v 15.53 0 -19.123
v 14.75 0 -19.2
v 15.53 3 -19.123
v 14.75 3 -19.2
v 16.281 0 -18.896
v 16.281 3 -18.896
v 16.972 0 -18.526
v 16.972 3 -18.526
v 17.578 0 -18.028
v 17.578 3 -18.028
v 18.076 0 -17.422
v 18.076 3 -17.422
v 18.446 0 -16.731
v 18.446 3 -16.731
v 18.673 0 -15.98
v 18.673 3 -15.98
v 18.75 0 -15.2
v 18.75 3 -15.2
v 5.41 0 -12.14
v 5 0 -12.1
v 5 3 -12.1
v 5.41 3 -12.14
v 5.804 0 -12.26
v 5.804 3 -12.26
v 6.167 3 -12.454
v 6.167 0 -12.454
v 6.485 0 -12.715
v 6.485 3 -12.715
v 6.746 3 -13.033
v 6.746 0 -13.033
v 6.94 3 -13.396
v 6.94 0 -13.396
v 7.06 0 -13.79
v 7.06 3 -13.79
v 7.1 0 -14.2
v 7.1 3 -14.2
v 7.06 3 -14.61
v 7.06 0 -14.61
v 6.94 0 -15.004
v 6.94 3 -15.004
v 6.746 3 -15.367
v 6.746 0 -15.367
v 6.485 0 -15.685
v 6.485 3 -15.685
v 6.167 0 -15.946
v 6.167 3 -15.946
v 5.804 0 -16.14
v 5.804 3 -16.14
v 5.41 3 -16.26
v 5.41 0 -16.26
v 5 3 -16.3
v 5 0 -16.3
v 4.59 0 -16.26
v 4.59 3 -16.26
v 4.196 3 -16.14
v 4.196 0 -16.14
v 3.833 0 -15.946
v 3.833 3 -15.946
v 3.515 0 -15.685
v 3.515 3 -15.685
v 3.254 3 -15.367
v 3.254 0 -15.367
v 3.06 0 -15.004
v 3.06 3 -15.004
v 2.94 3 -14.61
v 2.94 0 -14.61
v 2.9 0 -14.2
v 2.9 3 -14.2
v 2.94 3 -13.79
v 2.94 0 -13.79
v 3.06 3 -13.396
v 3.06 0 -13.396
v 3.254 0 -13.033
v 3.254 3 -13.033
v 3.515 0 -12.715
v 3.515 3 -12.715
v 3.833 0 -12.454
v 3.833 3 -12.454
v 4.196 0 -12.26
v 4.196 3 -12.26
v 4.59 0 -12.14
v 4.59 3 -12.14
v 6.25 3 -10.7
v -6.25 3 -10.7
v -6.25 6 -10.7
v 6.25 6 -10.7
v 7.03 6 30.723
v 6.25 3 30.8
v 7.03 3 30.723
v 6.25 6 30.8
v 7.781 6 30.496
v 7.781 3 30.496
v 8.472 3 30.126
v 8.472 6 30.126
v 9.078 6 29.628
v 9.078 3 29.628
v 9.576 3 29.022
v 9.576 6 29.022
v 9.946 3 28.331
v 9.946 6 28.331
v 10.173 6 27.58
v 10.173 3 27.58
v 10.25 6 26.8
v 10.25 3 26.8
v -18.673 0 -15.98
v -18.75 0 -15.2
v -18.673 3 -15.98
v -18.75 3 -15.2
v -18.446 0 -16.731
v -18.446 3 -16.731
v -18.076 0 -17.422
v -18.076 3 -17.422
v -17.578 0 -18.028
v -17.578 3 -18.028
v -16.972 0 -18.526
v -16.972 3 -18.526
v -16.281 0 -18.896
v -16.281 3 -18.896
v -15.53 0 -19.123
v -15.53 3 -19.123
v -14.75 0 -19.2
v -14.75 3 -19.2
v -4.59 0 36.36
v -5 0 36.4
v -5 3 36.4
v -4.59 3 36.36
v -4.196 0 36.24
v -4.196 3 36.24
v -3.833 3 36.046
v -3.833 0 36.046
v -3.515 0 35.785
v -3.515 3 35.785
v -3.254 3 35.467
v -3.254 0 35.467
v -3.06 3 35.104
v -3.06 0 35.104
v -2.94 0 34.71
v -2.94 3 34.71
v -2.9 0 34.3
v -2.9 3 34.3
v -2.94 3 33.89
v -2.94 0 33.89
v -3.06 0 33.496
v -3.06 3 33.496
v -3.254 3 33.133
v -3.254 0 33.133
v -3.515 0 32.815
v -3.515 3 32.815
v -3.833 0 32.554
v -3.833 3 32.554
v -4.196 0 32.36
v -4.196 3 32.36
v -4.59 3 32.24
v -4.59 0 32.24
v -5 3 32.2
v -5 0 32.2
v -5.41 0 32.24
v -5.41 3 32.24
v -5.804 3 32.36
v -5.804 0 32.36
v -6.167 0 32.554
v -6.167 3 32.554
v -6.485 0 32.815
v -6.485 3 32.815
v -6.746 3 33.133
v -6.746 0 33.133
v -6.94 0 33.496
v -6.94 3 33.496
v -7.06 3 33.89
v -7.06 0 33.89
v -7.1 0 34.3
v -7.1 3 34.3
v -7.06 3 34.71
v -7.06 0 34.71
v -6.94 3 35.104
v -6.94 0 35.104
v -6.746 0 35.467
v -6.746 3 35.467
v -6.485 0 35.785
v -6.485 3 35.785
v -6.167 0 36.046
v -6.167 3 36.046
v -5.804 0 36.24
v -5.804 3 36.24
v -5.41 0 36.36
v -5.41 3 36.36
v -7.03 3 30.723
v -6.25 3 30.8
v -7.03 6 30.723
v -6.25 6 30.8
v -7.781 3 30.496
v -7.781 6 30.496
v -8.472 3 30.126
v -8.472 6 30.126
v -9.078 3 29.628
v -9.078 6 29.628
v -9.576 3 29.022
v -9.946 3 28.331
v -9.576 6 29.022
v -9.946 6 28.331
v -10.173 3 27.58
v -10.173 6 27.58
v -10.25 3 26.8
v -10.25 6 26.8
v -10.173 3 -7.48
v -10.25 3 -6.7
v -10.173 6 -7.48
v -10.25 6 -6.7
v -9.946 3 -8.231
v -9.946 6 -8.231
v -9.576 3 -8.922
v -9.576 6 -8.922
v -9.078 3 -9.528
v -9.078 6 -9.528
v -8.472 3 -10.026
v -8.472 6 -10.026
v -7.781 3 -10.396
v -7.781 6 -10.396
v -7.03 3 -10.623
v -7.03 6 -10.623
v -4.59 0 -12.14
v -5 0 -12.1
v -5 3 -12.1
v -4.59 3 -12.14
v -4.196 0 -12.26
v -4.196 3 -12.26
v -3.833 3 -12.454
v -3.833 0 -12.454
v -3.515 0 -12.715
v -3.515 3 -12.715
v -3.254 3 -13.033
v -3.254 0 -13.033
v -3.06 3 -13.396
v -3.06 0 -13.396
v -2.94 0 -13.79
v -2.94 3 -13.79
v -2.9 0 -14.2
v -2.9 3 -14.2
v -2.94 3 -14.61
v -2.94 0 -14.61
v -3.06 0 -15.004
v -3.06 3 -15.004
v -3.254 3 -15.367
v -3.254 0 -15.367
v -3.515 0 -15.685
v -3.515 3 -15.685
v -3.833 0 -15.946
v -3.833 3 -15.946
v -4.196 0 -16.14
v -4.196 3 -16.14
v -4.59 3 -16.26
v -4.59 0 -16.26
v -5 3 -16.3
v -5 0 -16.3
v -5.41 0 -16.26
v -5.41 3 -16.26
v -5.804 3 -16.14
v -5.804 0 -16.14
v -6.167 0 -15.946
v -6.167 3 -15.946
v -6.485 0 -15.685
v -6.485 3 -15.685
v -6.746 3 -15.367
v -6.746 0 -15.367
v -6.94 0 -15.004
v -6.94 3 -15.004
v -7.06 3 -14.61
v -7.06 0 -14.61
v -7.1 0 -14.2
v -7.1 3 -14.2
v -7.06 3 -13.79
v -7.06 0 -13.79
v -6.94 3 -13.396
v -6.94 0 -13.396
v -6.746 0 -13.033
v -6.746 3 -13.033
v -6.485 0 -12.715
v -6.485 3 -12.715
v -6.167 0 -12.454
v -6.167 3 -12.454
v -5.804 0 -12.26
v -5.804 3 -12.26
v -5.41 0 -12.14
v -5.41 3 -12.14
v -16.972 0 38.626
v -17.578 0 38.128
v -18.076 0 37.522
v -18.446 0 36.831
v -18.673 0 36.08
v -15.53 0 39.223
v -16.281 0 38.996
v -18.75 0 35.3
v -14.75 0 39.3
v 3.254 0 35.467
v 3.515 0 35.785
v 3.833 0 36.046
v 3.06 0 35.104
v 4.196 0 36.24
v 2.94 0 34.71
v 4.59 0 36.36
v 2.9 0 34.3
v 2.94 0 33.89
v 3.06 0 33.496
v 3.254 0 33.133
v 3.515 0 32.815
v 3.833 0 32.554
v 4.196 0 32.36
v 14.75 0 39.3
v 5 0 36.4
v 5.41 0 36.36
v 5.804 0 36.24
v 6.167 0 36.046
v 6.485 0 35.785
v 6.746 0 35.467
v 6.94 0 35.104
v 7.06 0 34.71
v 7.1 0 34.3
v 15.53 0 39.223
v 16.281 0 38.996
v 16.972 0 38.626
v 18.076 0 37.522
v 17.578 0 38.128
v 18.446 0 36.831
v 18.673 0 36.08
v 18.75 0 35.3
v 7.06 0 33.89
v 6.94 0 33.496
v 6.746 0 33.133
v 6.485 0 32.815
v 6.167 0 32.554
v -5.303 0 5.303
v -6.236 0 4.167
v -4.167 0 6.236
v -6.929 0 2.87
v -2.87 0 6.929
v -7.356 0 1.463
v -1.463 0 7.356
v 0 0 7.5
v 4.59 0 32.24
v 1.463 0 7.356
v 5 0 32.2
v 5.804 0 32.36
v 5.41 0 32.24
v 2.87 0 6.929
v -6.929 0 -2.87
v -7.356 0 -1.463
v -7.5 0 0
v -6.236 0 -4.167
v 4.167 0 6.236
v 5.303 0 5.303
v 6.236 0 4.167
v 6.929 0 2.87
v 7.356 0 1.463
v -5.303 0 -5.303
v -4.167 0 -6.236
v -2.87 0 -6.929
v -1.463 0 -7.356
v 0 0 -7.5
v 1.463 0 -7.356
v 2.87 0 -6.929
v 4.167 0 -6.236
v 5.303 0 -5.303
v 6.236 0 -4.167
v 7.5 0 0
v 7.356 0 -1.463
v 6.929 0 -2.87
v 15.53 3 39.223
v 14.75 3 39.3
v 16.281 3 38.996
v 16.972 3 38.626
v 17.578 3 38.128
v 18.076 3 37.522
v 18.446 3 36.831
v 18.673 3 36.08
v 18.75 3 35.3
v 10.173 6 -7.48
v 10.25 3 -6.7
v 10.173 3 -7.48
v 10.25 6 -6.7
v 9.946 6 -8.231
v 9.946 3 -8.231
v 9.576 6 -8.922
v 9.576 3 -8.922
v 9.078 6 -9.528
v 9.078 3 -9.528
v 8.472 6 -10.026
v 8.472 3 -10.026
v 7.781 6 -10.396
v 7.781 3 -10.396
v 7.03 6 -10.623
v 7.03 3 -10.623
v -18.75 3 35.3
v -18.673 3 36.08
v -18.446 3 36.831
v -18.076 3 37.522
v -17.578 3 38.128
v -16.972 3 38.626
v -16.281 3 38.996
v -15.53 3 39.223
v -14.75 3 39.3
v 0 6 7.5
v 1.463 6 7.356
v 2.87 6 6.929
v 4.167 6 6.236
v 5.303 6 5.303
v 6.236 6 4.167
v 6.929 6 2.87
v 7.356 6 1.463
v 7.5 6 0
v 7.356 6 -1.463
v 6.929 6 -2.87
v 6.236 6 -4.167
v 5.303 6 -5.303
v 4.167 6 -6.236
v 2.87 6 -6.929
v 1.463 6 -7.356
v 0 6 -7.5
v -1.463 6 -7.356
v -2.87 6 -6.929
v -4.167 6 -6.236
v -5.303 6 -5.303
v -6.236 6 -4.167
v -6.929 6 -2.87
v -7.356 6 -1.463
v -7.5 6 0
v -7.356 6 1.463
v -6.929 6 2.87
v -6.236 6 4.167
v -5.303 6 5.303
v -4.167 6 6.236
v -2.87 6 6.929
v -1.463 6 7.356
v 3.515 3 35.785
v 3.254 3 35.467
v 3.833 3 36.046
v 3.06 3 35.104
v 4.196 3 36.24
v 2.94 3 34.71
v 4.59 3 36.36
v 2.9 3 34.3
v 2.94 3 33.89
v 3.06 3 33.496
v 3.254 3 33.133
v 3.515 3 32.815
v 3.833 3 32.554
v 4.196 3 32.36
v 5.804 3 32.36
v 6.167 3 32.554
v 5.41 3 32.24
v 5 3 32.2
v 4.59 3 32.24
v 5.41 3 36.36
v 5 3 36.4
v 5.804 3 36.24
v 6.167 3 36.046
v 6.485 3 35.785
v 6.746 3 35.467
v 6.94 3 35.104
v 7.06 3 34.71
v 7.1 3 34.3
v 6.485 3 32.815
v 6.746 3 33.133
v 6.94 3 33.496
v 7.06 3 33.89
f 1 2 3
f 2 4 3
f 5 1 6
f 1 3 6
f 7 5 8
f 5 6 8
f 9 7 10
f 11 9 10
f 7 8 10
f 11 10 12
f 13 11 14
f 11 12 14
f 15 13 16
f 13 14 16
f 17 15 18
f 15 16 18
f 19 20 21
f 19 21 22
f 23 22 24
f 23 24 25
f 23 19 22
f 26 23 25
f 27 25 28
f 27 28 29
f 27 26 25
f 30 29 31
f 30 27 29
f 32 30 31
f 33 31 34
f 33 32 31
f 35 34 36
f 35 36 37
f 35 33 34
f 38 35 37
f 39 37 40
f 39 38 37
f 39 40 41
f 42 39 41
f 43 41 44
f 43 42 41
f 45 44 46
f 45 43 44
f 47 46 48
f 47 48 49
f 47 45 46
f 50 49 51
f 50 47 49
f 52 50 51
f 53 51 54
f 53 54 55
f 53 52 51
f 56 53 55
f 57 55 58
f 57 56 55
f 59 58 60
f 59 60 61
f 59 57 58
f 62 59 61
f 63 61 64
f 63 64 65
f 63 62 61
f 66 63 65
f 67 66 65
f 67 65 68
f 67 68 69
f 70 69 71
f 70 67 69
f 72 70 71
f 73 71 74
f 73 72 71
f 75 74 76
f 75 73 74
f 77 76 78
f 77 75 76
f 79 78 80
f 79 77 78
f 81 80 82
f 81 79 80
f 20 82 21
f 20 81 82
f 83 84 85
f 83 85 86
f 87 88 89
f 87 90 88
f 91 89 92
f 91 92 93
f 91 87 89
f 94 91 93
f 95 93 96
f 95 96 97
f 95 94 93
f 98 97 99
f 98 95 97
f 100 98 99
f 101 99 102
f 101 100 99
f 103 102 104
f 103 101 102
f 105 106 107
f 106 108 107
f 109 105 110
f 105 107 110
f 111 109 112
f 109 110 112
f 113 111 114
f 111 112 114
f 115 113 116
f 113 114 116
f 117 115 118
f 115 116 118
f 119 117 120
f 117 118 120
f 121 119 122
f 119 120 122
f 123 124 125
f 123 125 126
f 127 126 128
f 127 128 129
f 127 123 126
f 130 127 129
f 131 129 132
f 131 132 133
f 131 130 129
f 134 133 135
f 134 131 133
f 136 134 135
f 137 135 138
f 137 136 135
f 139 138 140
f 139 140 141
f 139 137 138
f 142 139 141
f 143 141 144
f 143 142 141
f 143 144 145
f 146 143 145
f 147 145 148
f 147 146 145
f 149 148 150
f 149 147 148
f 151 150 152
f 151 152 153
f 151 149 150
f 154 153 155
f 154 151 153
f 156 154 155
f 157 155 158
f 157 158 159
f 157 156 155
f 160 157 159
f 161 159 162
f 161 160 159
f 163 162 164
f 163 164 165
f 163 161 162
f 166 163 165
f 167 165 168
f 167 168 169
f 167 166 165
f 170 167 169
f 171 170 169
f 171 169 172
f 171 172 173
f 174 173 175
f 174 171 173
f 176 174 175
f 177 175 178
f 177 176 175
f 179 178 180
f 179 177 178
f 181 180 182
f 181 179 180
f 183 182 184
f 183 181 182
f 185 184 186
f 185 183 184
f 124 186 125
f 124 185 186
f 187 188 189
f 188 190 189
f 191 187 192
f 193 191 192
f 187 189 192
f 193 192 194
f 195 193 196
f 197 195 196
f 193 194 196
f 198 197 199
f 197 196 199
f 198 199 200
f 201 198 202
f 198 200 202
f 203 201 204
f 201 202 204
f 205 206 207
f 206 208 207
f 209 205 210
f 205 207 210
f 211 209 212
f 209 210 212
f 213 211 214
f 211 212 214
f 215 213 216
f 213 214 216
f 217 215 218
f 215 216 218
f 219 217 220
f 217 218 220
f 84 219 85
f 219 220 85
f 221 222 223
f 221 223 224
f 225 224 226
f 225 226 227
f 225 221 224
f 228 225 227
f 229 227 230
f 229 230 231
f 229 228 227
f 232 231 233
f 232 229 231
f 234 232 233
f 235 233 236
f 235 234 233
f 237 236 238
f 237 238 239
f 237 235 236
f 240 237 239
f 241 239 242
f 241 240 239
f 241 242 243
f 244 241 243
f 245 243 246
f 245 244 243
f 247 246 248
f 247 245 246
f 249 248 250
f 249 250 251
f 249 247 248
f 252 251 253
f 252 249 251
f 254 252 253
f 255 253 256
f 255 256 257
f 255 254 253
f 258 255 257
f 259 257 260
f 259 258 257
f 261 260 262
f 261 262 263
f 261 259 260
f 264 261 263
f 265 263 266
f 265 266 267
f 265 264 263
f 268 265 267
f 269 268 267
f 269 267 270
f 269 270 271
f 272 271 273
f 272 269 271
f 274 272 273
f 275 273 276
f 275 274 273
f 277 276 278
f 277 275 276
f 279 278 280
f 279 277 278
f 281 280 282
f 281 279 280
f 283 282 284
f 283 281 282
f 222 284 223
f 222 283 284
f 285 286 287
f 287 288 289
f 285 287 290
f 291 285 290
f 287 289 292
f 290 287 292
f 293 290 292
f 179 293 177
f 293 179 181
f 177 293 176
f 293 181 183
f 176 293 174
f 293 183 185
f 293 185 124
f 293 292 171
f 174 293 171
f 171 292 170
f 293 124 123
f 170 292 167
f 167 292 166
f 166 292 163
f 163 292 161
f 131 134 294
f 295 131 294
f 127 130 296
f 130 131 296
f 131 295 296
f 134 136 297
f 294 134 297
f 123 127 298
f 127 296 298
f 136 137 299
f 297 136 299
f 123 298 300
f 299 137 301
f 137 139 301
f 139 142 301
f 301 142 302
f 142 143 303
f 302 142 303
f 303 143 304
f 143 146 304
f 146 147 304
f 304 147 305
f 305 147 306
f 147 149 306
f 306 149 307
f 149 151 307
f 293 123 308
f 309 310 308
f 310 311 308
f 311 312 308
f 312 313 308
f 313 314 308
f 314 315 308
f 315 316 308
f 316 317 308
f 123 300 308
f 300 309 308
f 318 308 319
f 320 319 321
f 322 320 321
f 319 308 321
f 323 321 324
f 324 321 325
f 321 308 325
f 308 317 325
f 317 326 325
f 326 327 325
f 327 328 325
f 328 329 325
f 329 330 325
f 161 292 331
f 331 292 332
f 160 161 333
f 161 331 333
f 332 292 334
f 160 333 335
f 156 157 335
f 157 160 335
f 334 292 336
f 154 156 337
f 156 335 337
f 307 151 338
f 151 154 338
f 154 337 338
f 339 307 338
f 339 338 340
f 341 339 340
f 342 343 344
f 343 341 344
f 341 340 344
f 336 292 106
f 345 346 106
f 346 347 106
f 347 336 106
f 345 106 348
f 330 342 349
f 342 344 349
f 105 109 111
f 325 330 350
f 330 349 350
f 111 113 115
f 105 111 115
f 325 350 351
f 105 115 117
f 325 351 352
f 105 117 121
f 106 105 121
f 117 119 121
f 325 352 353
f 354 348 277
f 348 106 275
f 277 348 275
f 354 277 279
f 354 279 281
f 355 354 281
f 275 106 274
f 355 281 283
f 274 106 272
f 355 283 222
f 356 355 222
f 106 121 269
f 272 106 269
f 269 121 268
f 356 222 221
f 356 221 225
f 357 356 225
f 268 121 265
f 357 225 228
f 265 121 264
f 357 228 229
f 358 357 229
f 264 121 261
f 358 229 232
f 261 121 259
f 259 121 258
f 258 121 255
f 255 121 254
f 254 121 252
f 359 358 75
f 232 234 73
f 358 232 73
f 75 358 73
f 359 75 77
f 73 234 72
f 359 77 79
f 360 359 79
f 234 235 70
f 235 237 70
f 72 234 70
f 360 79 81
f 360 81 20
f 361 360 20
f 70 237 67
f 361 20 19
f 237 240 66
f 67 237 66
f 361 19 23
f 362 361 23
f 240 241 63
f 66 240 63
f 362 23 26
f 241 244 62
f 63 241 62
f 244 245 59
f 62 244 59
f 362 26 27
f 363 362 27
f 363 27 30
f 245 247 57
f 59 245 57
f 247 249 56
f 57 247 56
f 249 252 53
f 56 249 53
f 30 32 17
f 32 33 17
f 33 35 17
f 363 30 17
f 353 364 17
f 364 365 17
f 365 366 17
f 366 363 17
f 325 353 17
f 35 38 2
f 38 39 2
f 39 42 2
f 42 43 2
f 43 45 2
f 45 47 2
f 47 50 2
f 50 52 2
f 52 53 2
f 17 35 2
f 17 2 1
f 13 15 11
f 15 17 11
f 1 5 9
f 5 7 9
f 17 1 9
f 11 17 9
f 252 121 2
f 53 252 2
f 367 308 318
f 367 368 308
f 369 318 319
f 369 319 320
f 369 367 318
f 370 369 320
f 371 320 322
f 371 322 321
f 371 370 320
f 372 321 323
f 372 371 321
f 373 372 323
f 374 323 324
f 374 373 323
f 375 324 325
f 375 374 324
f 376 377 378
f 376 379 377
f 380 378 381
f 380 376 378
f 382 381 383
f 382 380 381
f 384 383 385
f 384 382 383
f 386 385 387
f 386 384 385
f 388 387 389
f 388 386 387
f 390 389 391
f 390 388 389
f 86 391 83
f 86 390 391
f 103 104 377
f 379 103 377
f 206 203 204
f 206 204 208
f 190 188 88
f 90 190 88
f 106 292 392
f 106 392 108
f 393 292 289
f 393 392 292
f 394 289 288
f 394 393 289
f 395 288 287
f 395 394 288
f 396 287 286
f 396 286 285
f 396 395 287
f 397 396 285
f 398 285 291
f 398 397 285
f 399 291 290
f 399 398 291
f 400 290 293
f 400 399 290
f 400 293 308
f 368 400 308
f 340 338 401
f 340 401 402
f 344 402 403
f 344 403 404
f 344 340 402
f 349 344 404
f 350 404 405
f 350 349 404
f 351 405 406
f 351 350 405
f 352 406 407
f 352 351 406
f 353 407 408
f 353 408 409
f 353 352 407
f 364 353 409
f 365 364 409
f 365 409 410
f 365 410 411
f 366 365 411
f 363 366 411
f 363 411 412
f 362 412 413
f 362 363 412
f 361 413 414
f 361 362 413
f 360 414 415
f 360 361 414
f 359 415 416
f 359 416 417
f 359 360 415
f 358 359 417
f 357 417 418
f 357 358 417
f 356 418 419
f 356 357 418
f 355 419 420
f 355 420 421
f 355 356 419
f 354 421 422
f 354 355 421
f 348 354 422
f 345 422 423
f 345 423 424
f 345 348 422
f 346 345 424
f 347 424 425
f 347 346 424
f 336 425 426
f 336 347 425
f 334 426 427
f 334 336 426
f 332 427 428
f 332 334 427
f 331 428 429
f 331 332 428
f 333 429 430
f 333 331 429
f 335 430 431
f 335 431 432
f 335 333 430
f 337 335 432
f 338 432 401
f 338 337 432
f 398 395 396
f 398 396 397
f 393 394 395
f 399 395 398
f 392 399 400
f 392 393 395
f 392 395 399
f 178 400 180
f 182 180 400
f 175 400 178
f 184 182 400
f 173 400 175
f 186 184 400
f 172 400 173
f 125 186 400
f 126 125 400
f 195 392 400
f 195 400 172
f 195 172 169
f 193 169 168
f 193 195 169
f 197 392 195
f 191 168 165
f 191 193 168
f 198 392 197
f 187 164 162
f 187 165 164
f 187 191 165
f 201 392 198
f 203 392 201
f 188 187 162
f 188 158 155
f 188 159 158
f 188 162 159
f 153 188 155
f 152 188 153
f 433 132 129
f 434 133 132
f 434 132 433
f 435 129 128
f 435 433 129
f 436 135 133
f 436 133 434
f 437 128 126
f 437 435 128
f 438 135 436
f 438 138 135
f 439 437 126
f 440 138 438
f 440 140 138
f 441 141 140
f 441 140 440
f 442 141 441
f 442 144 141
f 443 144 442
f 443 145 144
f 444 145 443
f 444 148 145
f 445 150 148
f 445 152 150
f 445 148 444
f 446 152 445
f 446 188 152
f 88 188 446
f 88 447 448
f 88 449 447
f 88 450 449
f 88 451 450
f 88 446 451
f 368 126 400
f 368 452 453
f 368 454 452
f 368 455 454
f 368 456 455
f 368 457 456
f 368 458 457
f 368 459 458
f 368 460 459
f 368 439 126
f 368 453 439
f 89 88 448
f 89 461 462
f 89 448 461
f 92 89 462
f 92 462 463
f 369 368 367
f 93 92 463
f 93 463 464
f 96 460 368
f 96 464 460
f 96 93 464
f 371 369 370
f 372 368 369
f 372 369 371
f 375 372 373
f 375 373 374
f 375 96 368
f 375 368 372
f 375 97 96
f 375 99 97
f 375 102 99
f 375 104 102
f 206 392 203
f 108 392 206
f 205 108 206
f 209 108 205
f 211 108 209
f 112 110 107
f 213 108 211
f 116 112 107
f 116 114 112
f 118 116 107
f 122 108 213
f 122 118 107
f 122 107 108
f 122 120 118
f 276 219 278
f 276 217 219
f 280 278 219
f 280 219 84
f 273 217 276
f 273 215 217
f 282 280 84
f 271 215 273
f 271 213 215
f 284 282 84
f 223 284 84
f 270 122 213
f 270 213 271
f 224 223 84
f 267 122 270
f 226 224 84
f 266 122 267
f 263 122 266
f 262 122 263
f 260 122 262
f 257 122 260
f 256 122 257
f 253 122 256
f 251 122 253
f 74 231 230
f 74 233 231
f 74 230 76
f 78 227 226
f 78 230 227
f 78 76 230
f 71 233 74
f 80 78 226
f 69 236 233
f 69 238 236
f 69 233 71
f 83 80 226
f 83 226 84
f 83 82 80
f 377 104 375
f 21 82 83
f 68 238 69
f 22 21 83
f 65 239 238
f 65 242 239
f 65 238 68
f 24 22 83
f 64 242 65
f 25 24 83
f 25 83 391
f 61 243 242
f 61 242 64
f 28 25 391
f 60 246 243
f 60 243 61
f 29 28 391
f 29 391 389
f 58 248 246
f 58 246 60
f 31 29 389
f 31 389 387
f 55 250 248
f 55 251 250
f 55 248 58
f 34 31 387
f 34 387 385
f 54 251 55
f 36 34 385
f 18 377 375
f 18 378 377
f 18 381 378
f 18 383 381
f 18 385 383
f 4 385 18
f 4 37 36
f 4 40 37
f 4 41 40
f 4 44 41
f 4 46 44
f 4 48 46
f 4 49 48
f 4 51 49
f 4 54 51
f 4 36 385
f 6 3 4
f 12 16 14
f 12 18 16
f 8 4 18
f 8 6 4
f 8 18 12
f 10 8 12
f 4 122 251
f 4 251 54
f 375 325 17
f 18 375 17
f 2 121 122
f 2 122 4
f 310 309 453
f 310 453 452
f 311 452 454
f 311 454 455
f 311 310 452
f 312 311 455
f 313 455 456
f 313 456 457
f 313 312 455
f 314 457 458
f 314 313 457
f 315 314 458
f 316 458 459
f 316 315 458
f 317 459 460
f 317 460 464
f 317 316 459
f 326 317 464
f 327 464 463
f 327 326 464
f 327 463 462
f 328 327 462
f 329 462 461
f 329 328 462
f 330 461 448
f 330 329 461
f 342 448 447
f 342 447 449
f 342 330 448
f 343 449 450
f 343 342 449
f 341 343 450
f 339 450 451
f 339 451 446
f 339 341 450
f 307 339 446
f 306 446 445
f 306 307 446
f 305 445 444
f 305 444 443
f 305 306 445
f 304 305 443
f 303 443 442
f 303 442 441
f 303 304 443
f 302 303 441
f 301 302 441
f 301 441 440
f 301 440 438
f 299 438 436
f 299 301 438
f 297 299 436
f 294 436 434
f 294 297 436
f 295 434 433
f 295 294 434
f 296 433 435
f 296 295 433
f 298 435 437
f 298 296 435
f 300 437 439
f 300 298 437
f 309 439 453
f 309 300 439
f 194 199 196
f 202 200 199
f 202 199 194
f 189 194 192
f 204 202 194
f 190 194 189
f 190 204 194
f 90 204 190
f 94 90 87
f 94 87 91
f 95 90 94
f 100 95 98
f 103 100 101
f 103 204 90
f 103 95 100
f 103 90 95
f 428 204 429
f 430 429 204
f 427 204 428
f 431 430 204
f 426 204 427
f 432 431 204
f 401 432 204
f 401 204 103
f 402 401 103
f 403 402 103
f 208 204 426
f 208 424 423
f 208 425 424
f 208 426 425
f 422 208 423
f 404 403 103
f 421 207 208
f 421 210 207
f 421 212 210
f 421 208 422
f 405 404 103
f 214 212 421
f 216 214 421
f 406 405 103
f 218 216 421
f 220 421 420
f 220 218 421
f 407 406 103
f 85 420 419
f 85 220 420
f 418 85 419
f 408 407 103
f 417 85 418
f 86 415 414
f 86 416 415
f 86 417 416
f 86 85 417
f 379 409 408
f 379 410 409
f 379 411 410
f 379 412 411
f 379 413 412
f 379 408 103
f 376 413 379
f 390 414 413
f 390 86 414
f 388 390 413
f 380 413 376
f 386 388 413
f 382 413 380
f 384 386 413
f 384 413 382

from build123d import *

# Parameters (mm, degrees)
SKETCH1_W           = 20.5
SKETCH1_H           = 41.5
SKETCH1_R           = 7.5
BOSS_EXTRUDE2_DEPTH = 6
SKETCH1_3_W         = 37.5
SKETCH1_3_H         = 58.5
SKETCH1_3_R         = 2.1
SKETCH1_3_W_2       = 20.5
SKETCH1_3_H_2       = 41.5
BOSS_EXTRUDE3_DEPTH = 3
FILLET1_R           = 4


with BuildPart() as part:
    # Sketch1 → Boss-Extrude2 (new body)
    with BuildSketch(Plane(origin=(0, 0, 0), x_dir=(1, 0, 0), z_dir=(0, 1, 0))):
        with Locations((0, -10.05)):
            Rectangle(SKETCH1_W, SKETCH1_H)
        Circle(SKETCH1_R, mode=Mode.SUBTRACT)
    extrude(amount=BOSS_EXTRUDE2_DEPTH)

    # Sketch1<3> → Boss-Extrude3 (add)
    with BuildSketch(Plane(origin=(0, 0, 0), x_dir=(1, 0, 0), z_dir=(0, 1, 0))):
        with Locations((0, -10.05)):
            Rectangle(SKETCH1_3_W, SKETCH1_3_H)
        with Locations((-5, -34.3)):
            Circle(SKETCH1_3_R, mode=Mode.SUBTRACT)
        with Locations((5, -34.3)):
            Circle(SKETCH1_3_R, mode=Mode.SUBTRACT)
        with Locations((-5, 14.2)):
            Circle(SKETCH1_3_R, mode=Mode.SUBTRACT)
        with Locations((0, -10.05)):
            Rectangle(SKETCH1_3_W_2, SKETCH1_3_H_2, mode=Mode.SUBTRACT)
        with Locations((5, 14.2)):
            Circle(SKETCH1_3_R, mode=Mode.SUBTRACT)
    extrude(amount=BOSS_EXTRUDE3_DEPTH)

    # Fillet1
    fillet1_edges = [part.edges().sort_by_distance(p)[0] for p in [
        (-18.75, 1.5, -19.2),
        (18.75, 1.5, -19.2),
        (18.75, 1.5, 39.3),
        (-18.75, 1.5, 39.3),
        (-10.25, 4.5, -10.7),
        (10.25, 4.5, -10.7),
        (10.25, 4.5, 30.8),
        (-10.25, 4.5, 30.8),
    ]]
    fillet(fillet1_edges, radius=FILLET1_R)


solid = part.part
